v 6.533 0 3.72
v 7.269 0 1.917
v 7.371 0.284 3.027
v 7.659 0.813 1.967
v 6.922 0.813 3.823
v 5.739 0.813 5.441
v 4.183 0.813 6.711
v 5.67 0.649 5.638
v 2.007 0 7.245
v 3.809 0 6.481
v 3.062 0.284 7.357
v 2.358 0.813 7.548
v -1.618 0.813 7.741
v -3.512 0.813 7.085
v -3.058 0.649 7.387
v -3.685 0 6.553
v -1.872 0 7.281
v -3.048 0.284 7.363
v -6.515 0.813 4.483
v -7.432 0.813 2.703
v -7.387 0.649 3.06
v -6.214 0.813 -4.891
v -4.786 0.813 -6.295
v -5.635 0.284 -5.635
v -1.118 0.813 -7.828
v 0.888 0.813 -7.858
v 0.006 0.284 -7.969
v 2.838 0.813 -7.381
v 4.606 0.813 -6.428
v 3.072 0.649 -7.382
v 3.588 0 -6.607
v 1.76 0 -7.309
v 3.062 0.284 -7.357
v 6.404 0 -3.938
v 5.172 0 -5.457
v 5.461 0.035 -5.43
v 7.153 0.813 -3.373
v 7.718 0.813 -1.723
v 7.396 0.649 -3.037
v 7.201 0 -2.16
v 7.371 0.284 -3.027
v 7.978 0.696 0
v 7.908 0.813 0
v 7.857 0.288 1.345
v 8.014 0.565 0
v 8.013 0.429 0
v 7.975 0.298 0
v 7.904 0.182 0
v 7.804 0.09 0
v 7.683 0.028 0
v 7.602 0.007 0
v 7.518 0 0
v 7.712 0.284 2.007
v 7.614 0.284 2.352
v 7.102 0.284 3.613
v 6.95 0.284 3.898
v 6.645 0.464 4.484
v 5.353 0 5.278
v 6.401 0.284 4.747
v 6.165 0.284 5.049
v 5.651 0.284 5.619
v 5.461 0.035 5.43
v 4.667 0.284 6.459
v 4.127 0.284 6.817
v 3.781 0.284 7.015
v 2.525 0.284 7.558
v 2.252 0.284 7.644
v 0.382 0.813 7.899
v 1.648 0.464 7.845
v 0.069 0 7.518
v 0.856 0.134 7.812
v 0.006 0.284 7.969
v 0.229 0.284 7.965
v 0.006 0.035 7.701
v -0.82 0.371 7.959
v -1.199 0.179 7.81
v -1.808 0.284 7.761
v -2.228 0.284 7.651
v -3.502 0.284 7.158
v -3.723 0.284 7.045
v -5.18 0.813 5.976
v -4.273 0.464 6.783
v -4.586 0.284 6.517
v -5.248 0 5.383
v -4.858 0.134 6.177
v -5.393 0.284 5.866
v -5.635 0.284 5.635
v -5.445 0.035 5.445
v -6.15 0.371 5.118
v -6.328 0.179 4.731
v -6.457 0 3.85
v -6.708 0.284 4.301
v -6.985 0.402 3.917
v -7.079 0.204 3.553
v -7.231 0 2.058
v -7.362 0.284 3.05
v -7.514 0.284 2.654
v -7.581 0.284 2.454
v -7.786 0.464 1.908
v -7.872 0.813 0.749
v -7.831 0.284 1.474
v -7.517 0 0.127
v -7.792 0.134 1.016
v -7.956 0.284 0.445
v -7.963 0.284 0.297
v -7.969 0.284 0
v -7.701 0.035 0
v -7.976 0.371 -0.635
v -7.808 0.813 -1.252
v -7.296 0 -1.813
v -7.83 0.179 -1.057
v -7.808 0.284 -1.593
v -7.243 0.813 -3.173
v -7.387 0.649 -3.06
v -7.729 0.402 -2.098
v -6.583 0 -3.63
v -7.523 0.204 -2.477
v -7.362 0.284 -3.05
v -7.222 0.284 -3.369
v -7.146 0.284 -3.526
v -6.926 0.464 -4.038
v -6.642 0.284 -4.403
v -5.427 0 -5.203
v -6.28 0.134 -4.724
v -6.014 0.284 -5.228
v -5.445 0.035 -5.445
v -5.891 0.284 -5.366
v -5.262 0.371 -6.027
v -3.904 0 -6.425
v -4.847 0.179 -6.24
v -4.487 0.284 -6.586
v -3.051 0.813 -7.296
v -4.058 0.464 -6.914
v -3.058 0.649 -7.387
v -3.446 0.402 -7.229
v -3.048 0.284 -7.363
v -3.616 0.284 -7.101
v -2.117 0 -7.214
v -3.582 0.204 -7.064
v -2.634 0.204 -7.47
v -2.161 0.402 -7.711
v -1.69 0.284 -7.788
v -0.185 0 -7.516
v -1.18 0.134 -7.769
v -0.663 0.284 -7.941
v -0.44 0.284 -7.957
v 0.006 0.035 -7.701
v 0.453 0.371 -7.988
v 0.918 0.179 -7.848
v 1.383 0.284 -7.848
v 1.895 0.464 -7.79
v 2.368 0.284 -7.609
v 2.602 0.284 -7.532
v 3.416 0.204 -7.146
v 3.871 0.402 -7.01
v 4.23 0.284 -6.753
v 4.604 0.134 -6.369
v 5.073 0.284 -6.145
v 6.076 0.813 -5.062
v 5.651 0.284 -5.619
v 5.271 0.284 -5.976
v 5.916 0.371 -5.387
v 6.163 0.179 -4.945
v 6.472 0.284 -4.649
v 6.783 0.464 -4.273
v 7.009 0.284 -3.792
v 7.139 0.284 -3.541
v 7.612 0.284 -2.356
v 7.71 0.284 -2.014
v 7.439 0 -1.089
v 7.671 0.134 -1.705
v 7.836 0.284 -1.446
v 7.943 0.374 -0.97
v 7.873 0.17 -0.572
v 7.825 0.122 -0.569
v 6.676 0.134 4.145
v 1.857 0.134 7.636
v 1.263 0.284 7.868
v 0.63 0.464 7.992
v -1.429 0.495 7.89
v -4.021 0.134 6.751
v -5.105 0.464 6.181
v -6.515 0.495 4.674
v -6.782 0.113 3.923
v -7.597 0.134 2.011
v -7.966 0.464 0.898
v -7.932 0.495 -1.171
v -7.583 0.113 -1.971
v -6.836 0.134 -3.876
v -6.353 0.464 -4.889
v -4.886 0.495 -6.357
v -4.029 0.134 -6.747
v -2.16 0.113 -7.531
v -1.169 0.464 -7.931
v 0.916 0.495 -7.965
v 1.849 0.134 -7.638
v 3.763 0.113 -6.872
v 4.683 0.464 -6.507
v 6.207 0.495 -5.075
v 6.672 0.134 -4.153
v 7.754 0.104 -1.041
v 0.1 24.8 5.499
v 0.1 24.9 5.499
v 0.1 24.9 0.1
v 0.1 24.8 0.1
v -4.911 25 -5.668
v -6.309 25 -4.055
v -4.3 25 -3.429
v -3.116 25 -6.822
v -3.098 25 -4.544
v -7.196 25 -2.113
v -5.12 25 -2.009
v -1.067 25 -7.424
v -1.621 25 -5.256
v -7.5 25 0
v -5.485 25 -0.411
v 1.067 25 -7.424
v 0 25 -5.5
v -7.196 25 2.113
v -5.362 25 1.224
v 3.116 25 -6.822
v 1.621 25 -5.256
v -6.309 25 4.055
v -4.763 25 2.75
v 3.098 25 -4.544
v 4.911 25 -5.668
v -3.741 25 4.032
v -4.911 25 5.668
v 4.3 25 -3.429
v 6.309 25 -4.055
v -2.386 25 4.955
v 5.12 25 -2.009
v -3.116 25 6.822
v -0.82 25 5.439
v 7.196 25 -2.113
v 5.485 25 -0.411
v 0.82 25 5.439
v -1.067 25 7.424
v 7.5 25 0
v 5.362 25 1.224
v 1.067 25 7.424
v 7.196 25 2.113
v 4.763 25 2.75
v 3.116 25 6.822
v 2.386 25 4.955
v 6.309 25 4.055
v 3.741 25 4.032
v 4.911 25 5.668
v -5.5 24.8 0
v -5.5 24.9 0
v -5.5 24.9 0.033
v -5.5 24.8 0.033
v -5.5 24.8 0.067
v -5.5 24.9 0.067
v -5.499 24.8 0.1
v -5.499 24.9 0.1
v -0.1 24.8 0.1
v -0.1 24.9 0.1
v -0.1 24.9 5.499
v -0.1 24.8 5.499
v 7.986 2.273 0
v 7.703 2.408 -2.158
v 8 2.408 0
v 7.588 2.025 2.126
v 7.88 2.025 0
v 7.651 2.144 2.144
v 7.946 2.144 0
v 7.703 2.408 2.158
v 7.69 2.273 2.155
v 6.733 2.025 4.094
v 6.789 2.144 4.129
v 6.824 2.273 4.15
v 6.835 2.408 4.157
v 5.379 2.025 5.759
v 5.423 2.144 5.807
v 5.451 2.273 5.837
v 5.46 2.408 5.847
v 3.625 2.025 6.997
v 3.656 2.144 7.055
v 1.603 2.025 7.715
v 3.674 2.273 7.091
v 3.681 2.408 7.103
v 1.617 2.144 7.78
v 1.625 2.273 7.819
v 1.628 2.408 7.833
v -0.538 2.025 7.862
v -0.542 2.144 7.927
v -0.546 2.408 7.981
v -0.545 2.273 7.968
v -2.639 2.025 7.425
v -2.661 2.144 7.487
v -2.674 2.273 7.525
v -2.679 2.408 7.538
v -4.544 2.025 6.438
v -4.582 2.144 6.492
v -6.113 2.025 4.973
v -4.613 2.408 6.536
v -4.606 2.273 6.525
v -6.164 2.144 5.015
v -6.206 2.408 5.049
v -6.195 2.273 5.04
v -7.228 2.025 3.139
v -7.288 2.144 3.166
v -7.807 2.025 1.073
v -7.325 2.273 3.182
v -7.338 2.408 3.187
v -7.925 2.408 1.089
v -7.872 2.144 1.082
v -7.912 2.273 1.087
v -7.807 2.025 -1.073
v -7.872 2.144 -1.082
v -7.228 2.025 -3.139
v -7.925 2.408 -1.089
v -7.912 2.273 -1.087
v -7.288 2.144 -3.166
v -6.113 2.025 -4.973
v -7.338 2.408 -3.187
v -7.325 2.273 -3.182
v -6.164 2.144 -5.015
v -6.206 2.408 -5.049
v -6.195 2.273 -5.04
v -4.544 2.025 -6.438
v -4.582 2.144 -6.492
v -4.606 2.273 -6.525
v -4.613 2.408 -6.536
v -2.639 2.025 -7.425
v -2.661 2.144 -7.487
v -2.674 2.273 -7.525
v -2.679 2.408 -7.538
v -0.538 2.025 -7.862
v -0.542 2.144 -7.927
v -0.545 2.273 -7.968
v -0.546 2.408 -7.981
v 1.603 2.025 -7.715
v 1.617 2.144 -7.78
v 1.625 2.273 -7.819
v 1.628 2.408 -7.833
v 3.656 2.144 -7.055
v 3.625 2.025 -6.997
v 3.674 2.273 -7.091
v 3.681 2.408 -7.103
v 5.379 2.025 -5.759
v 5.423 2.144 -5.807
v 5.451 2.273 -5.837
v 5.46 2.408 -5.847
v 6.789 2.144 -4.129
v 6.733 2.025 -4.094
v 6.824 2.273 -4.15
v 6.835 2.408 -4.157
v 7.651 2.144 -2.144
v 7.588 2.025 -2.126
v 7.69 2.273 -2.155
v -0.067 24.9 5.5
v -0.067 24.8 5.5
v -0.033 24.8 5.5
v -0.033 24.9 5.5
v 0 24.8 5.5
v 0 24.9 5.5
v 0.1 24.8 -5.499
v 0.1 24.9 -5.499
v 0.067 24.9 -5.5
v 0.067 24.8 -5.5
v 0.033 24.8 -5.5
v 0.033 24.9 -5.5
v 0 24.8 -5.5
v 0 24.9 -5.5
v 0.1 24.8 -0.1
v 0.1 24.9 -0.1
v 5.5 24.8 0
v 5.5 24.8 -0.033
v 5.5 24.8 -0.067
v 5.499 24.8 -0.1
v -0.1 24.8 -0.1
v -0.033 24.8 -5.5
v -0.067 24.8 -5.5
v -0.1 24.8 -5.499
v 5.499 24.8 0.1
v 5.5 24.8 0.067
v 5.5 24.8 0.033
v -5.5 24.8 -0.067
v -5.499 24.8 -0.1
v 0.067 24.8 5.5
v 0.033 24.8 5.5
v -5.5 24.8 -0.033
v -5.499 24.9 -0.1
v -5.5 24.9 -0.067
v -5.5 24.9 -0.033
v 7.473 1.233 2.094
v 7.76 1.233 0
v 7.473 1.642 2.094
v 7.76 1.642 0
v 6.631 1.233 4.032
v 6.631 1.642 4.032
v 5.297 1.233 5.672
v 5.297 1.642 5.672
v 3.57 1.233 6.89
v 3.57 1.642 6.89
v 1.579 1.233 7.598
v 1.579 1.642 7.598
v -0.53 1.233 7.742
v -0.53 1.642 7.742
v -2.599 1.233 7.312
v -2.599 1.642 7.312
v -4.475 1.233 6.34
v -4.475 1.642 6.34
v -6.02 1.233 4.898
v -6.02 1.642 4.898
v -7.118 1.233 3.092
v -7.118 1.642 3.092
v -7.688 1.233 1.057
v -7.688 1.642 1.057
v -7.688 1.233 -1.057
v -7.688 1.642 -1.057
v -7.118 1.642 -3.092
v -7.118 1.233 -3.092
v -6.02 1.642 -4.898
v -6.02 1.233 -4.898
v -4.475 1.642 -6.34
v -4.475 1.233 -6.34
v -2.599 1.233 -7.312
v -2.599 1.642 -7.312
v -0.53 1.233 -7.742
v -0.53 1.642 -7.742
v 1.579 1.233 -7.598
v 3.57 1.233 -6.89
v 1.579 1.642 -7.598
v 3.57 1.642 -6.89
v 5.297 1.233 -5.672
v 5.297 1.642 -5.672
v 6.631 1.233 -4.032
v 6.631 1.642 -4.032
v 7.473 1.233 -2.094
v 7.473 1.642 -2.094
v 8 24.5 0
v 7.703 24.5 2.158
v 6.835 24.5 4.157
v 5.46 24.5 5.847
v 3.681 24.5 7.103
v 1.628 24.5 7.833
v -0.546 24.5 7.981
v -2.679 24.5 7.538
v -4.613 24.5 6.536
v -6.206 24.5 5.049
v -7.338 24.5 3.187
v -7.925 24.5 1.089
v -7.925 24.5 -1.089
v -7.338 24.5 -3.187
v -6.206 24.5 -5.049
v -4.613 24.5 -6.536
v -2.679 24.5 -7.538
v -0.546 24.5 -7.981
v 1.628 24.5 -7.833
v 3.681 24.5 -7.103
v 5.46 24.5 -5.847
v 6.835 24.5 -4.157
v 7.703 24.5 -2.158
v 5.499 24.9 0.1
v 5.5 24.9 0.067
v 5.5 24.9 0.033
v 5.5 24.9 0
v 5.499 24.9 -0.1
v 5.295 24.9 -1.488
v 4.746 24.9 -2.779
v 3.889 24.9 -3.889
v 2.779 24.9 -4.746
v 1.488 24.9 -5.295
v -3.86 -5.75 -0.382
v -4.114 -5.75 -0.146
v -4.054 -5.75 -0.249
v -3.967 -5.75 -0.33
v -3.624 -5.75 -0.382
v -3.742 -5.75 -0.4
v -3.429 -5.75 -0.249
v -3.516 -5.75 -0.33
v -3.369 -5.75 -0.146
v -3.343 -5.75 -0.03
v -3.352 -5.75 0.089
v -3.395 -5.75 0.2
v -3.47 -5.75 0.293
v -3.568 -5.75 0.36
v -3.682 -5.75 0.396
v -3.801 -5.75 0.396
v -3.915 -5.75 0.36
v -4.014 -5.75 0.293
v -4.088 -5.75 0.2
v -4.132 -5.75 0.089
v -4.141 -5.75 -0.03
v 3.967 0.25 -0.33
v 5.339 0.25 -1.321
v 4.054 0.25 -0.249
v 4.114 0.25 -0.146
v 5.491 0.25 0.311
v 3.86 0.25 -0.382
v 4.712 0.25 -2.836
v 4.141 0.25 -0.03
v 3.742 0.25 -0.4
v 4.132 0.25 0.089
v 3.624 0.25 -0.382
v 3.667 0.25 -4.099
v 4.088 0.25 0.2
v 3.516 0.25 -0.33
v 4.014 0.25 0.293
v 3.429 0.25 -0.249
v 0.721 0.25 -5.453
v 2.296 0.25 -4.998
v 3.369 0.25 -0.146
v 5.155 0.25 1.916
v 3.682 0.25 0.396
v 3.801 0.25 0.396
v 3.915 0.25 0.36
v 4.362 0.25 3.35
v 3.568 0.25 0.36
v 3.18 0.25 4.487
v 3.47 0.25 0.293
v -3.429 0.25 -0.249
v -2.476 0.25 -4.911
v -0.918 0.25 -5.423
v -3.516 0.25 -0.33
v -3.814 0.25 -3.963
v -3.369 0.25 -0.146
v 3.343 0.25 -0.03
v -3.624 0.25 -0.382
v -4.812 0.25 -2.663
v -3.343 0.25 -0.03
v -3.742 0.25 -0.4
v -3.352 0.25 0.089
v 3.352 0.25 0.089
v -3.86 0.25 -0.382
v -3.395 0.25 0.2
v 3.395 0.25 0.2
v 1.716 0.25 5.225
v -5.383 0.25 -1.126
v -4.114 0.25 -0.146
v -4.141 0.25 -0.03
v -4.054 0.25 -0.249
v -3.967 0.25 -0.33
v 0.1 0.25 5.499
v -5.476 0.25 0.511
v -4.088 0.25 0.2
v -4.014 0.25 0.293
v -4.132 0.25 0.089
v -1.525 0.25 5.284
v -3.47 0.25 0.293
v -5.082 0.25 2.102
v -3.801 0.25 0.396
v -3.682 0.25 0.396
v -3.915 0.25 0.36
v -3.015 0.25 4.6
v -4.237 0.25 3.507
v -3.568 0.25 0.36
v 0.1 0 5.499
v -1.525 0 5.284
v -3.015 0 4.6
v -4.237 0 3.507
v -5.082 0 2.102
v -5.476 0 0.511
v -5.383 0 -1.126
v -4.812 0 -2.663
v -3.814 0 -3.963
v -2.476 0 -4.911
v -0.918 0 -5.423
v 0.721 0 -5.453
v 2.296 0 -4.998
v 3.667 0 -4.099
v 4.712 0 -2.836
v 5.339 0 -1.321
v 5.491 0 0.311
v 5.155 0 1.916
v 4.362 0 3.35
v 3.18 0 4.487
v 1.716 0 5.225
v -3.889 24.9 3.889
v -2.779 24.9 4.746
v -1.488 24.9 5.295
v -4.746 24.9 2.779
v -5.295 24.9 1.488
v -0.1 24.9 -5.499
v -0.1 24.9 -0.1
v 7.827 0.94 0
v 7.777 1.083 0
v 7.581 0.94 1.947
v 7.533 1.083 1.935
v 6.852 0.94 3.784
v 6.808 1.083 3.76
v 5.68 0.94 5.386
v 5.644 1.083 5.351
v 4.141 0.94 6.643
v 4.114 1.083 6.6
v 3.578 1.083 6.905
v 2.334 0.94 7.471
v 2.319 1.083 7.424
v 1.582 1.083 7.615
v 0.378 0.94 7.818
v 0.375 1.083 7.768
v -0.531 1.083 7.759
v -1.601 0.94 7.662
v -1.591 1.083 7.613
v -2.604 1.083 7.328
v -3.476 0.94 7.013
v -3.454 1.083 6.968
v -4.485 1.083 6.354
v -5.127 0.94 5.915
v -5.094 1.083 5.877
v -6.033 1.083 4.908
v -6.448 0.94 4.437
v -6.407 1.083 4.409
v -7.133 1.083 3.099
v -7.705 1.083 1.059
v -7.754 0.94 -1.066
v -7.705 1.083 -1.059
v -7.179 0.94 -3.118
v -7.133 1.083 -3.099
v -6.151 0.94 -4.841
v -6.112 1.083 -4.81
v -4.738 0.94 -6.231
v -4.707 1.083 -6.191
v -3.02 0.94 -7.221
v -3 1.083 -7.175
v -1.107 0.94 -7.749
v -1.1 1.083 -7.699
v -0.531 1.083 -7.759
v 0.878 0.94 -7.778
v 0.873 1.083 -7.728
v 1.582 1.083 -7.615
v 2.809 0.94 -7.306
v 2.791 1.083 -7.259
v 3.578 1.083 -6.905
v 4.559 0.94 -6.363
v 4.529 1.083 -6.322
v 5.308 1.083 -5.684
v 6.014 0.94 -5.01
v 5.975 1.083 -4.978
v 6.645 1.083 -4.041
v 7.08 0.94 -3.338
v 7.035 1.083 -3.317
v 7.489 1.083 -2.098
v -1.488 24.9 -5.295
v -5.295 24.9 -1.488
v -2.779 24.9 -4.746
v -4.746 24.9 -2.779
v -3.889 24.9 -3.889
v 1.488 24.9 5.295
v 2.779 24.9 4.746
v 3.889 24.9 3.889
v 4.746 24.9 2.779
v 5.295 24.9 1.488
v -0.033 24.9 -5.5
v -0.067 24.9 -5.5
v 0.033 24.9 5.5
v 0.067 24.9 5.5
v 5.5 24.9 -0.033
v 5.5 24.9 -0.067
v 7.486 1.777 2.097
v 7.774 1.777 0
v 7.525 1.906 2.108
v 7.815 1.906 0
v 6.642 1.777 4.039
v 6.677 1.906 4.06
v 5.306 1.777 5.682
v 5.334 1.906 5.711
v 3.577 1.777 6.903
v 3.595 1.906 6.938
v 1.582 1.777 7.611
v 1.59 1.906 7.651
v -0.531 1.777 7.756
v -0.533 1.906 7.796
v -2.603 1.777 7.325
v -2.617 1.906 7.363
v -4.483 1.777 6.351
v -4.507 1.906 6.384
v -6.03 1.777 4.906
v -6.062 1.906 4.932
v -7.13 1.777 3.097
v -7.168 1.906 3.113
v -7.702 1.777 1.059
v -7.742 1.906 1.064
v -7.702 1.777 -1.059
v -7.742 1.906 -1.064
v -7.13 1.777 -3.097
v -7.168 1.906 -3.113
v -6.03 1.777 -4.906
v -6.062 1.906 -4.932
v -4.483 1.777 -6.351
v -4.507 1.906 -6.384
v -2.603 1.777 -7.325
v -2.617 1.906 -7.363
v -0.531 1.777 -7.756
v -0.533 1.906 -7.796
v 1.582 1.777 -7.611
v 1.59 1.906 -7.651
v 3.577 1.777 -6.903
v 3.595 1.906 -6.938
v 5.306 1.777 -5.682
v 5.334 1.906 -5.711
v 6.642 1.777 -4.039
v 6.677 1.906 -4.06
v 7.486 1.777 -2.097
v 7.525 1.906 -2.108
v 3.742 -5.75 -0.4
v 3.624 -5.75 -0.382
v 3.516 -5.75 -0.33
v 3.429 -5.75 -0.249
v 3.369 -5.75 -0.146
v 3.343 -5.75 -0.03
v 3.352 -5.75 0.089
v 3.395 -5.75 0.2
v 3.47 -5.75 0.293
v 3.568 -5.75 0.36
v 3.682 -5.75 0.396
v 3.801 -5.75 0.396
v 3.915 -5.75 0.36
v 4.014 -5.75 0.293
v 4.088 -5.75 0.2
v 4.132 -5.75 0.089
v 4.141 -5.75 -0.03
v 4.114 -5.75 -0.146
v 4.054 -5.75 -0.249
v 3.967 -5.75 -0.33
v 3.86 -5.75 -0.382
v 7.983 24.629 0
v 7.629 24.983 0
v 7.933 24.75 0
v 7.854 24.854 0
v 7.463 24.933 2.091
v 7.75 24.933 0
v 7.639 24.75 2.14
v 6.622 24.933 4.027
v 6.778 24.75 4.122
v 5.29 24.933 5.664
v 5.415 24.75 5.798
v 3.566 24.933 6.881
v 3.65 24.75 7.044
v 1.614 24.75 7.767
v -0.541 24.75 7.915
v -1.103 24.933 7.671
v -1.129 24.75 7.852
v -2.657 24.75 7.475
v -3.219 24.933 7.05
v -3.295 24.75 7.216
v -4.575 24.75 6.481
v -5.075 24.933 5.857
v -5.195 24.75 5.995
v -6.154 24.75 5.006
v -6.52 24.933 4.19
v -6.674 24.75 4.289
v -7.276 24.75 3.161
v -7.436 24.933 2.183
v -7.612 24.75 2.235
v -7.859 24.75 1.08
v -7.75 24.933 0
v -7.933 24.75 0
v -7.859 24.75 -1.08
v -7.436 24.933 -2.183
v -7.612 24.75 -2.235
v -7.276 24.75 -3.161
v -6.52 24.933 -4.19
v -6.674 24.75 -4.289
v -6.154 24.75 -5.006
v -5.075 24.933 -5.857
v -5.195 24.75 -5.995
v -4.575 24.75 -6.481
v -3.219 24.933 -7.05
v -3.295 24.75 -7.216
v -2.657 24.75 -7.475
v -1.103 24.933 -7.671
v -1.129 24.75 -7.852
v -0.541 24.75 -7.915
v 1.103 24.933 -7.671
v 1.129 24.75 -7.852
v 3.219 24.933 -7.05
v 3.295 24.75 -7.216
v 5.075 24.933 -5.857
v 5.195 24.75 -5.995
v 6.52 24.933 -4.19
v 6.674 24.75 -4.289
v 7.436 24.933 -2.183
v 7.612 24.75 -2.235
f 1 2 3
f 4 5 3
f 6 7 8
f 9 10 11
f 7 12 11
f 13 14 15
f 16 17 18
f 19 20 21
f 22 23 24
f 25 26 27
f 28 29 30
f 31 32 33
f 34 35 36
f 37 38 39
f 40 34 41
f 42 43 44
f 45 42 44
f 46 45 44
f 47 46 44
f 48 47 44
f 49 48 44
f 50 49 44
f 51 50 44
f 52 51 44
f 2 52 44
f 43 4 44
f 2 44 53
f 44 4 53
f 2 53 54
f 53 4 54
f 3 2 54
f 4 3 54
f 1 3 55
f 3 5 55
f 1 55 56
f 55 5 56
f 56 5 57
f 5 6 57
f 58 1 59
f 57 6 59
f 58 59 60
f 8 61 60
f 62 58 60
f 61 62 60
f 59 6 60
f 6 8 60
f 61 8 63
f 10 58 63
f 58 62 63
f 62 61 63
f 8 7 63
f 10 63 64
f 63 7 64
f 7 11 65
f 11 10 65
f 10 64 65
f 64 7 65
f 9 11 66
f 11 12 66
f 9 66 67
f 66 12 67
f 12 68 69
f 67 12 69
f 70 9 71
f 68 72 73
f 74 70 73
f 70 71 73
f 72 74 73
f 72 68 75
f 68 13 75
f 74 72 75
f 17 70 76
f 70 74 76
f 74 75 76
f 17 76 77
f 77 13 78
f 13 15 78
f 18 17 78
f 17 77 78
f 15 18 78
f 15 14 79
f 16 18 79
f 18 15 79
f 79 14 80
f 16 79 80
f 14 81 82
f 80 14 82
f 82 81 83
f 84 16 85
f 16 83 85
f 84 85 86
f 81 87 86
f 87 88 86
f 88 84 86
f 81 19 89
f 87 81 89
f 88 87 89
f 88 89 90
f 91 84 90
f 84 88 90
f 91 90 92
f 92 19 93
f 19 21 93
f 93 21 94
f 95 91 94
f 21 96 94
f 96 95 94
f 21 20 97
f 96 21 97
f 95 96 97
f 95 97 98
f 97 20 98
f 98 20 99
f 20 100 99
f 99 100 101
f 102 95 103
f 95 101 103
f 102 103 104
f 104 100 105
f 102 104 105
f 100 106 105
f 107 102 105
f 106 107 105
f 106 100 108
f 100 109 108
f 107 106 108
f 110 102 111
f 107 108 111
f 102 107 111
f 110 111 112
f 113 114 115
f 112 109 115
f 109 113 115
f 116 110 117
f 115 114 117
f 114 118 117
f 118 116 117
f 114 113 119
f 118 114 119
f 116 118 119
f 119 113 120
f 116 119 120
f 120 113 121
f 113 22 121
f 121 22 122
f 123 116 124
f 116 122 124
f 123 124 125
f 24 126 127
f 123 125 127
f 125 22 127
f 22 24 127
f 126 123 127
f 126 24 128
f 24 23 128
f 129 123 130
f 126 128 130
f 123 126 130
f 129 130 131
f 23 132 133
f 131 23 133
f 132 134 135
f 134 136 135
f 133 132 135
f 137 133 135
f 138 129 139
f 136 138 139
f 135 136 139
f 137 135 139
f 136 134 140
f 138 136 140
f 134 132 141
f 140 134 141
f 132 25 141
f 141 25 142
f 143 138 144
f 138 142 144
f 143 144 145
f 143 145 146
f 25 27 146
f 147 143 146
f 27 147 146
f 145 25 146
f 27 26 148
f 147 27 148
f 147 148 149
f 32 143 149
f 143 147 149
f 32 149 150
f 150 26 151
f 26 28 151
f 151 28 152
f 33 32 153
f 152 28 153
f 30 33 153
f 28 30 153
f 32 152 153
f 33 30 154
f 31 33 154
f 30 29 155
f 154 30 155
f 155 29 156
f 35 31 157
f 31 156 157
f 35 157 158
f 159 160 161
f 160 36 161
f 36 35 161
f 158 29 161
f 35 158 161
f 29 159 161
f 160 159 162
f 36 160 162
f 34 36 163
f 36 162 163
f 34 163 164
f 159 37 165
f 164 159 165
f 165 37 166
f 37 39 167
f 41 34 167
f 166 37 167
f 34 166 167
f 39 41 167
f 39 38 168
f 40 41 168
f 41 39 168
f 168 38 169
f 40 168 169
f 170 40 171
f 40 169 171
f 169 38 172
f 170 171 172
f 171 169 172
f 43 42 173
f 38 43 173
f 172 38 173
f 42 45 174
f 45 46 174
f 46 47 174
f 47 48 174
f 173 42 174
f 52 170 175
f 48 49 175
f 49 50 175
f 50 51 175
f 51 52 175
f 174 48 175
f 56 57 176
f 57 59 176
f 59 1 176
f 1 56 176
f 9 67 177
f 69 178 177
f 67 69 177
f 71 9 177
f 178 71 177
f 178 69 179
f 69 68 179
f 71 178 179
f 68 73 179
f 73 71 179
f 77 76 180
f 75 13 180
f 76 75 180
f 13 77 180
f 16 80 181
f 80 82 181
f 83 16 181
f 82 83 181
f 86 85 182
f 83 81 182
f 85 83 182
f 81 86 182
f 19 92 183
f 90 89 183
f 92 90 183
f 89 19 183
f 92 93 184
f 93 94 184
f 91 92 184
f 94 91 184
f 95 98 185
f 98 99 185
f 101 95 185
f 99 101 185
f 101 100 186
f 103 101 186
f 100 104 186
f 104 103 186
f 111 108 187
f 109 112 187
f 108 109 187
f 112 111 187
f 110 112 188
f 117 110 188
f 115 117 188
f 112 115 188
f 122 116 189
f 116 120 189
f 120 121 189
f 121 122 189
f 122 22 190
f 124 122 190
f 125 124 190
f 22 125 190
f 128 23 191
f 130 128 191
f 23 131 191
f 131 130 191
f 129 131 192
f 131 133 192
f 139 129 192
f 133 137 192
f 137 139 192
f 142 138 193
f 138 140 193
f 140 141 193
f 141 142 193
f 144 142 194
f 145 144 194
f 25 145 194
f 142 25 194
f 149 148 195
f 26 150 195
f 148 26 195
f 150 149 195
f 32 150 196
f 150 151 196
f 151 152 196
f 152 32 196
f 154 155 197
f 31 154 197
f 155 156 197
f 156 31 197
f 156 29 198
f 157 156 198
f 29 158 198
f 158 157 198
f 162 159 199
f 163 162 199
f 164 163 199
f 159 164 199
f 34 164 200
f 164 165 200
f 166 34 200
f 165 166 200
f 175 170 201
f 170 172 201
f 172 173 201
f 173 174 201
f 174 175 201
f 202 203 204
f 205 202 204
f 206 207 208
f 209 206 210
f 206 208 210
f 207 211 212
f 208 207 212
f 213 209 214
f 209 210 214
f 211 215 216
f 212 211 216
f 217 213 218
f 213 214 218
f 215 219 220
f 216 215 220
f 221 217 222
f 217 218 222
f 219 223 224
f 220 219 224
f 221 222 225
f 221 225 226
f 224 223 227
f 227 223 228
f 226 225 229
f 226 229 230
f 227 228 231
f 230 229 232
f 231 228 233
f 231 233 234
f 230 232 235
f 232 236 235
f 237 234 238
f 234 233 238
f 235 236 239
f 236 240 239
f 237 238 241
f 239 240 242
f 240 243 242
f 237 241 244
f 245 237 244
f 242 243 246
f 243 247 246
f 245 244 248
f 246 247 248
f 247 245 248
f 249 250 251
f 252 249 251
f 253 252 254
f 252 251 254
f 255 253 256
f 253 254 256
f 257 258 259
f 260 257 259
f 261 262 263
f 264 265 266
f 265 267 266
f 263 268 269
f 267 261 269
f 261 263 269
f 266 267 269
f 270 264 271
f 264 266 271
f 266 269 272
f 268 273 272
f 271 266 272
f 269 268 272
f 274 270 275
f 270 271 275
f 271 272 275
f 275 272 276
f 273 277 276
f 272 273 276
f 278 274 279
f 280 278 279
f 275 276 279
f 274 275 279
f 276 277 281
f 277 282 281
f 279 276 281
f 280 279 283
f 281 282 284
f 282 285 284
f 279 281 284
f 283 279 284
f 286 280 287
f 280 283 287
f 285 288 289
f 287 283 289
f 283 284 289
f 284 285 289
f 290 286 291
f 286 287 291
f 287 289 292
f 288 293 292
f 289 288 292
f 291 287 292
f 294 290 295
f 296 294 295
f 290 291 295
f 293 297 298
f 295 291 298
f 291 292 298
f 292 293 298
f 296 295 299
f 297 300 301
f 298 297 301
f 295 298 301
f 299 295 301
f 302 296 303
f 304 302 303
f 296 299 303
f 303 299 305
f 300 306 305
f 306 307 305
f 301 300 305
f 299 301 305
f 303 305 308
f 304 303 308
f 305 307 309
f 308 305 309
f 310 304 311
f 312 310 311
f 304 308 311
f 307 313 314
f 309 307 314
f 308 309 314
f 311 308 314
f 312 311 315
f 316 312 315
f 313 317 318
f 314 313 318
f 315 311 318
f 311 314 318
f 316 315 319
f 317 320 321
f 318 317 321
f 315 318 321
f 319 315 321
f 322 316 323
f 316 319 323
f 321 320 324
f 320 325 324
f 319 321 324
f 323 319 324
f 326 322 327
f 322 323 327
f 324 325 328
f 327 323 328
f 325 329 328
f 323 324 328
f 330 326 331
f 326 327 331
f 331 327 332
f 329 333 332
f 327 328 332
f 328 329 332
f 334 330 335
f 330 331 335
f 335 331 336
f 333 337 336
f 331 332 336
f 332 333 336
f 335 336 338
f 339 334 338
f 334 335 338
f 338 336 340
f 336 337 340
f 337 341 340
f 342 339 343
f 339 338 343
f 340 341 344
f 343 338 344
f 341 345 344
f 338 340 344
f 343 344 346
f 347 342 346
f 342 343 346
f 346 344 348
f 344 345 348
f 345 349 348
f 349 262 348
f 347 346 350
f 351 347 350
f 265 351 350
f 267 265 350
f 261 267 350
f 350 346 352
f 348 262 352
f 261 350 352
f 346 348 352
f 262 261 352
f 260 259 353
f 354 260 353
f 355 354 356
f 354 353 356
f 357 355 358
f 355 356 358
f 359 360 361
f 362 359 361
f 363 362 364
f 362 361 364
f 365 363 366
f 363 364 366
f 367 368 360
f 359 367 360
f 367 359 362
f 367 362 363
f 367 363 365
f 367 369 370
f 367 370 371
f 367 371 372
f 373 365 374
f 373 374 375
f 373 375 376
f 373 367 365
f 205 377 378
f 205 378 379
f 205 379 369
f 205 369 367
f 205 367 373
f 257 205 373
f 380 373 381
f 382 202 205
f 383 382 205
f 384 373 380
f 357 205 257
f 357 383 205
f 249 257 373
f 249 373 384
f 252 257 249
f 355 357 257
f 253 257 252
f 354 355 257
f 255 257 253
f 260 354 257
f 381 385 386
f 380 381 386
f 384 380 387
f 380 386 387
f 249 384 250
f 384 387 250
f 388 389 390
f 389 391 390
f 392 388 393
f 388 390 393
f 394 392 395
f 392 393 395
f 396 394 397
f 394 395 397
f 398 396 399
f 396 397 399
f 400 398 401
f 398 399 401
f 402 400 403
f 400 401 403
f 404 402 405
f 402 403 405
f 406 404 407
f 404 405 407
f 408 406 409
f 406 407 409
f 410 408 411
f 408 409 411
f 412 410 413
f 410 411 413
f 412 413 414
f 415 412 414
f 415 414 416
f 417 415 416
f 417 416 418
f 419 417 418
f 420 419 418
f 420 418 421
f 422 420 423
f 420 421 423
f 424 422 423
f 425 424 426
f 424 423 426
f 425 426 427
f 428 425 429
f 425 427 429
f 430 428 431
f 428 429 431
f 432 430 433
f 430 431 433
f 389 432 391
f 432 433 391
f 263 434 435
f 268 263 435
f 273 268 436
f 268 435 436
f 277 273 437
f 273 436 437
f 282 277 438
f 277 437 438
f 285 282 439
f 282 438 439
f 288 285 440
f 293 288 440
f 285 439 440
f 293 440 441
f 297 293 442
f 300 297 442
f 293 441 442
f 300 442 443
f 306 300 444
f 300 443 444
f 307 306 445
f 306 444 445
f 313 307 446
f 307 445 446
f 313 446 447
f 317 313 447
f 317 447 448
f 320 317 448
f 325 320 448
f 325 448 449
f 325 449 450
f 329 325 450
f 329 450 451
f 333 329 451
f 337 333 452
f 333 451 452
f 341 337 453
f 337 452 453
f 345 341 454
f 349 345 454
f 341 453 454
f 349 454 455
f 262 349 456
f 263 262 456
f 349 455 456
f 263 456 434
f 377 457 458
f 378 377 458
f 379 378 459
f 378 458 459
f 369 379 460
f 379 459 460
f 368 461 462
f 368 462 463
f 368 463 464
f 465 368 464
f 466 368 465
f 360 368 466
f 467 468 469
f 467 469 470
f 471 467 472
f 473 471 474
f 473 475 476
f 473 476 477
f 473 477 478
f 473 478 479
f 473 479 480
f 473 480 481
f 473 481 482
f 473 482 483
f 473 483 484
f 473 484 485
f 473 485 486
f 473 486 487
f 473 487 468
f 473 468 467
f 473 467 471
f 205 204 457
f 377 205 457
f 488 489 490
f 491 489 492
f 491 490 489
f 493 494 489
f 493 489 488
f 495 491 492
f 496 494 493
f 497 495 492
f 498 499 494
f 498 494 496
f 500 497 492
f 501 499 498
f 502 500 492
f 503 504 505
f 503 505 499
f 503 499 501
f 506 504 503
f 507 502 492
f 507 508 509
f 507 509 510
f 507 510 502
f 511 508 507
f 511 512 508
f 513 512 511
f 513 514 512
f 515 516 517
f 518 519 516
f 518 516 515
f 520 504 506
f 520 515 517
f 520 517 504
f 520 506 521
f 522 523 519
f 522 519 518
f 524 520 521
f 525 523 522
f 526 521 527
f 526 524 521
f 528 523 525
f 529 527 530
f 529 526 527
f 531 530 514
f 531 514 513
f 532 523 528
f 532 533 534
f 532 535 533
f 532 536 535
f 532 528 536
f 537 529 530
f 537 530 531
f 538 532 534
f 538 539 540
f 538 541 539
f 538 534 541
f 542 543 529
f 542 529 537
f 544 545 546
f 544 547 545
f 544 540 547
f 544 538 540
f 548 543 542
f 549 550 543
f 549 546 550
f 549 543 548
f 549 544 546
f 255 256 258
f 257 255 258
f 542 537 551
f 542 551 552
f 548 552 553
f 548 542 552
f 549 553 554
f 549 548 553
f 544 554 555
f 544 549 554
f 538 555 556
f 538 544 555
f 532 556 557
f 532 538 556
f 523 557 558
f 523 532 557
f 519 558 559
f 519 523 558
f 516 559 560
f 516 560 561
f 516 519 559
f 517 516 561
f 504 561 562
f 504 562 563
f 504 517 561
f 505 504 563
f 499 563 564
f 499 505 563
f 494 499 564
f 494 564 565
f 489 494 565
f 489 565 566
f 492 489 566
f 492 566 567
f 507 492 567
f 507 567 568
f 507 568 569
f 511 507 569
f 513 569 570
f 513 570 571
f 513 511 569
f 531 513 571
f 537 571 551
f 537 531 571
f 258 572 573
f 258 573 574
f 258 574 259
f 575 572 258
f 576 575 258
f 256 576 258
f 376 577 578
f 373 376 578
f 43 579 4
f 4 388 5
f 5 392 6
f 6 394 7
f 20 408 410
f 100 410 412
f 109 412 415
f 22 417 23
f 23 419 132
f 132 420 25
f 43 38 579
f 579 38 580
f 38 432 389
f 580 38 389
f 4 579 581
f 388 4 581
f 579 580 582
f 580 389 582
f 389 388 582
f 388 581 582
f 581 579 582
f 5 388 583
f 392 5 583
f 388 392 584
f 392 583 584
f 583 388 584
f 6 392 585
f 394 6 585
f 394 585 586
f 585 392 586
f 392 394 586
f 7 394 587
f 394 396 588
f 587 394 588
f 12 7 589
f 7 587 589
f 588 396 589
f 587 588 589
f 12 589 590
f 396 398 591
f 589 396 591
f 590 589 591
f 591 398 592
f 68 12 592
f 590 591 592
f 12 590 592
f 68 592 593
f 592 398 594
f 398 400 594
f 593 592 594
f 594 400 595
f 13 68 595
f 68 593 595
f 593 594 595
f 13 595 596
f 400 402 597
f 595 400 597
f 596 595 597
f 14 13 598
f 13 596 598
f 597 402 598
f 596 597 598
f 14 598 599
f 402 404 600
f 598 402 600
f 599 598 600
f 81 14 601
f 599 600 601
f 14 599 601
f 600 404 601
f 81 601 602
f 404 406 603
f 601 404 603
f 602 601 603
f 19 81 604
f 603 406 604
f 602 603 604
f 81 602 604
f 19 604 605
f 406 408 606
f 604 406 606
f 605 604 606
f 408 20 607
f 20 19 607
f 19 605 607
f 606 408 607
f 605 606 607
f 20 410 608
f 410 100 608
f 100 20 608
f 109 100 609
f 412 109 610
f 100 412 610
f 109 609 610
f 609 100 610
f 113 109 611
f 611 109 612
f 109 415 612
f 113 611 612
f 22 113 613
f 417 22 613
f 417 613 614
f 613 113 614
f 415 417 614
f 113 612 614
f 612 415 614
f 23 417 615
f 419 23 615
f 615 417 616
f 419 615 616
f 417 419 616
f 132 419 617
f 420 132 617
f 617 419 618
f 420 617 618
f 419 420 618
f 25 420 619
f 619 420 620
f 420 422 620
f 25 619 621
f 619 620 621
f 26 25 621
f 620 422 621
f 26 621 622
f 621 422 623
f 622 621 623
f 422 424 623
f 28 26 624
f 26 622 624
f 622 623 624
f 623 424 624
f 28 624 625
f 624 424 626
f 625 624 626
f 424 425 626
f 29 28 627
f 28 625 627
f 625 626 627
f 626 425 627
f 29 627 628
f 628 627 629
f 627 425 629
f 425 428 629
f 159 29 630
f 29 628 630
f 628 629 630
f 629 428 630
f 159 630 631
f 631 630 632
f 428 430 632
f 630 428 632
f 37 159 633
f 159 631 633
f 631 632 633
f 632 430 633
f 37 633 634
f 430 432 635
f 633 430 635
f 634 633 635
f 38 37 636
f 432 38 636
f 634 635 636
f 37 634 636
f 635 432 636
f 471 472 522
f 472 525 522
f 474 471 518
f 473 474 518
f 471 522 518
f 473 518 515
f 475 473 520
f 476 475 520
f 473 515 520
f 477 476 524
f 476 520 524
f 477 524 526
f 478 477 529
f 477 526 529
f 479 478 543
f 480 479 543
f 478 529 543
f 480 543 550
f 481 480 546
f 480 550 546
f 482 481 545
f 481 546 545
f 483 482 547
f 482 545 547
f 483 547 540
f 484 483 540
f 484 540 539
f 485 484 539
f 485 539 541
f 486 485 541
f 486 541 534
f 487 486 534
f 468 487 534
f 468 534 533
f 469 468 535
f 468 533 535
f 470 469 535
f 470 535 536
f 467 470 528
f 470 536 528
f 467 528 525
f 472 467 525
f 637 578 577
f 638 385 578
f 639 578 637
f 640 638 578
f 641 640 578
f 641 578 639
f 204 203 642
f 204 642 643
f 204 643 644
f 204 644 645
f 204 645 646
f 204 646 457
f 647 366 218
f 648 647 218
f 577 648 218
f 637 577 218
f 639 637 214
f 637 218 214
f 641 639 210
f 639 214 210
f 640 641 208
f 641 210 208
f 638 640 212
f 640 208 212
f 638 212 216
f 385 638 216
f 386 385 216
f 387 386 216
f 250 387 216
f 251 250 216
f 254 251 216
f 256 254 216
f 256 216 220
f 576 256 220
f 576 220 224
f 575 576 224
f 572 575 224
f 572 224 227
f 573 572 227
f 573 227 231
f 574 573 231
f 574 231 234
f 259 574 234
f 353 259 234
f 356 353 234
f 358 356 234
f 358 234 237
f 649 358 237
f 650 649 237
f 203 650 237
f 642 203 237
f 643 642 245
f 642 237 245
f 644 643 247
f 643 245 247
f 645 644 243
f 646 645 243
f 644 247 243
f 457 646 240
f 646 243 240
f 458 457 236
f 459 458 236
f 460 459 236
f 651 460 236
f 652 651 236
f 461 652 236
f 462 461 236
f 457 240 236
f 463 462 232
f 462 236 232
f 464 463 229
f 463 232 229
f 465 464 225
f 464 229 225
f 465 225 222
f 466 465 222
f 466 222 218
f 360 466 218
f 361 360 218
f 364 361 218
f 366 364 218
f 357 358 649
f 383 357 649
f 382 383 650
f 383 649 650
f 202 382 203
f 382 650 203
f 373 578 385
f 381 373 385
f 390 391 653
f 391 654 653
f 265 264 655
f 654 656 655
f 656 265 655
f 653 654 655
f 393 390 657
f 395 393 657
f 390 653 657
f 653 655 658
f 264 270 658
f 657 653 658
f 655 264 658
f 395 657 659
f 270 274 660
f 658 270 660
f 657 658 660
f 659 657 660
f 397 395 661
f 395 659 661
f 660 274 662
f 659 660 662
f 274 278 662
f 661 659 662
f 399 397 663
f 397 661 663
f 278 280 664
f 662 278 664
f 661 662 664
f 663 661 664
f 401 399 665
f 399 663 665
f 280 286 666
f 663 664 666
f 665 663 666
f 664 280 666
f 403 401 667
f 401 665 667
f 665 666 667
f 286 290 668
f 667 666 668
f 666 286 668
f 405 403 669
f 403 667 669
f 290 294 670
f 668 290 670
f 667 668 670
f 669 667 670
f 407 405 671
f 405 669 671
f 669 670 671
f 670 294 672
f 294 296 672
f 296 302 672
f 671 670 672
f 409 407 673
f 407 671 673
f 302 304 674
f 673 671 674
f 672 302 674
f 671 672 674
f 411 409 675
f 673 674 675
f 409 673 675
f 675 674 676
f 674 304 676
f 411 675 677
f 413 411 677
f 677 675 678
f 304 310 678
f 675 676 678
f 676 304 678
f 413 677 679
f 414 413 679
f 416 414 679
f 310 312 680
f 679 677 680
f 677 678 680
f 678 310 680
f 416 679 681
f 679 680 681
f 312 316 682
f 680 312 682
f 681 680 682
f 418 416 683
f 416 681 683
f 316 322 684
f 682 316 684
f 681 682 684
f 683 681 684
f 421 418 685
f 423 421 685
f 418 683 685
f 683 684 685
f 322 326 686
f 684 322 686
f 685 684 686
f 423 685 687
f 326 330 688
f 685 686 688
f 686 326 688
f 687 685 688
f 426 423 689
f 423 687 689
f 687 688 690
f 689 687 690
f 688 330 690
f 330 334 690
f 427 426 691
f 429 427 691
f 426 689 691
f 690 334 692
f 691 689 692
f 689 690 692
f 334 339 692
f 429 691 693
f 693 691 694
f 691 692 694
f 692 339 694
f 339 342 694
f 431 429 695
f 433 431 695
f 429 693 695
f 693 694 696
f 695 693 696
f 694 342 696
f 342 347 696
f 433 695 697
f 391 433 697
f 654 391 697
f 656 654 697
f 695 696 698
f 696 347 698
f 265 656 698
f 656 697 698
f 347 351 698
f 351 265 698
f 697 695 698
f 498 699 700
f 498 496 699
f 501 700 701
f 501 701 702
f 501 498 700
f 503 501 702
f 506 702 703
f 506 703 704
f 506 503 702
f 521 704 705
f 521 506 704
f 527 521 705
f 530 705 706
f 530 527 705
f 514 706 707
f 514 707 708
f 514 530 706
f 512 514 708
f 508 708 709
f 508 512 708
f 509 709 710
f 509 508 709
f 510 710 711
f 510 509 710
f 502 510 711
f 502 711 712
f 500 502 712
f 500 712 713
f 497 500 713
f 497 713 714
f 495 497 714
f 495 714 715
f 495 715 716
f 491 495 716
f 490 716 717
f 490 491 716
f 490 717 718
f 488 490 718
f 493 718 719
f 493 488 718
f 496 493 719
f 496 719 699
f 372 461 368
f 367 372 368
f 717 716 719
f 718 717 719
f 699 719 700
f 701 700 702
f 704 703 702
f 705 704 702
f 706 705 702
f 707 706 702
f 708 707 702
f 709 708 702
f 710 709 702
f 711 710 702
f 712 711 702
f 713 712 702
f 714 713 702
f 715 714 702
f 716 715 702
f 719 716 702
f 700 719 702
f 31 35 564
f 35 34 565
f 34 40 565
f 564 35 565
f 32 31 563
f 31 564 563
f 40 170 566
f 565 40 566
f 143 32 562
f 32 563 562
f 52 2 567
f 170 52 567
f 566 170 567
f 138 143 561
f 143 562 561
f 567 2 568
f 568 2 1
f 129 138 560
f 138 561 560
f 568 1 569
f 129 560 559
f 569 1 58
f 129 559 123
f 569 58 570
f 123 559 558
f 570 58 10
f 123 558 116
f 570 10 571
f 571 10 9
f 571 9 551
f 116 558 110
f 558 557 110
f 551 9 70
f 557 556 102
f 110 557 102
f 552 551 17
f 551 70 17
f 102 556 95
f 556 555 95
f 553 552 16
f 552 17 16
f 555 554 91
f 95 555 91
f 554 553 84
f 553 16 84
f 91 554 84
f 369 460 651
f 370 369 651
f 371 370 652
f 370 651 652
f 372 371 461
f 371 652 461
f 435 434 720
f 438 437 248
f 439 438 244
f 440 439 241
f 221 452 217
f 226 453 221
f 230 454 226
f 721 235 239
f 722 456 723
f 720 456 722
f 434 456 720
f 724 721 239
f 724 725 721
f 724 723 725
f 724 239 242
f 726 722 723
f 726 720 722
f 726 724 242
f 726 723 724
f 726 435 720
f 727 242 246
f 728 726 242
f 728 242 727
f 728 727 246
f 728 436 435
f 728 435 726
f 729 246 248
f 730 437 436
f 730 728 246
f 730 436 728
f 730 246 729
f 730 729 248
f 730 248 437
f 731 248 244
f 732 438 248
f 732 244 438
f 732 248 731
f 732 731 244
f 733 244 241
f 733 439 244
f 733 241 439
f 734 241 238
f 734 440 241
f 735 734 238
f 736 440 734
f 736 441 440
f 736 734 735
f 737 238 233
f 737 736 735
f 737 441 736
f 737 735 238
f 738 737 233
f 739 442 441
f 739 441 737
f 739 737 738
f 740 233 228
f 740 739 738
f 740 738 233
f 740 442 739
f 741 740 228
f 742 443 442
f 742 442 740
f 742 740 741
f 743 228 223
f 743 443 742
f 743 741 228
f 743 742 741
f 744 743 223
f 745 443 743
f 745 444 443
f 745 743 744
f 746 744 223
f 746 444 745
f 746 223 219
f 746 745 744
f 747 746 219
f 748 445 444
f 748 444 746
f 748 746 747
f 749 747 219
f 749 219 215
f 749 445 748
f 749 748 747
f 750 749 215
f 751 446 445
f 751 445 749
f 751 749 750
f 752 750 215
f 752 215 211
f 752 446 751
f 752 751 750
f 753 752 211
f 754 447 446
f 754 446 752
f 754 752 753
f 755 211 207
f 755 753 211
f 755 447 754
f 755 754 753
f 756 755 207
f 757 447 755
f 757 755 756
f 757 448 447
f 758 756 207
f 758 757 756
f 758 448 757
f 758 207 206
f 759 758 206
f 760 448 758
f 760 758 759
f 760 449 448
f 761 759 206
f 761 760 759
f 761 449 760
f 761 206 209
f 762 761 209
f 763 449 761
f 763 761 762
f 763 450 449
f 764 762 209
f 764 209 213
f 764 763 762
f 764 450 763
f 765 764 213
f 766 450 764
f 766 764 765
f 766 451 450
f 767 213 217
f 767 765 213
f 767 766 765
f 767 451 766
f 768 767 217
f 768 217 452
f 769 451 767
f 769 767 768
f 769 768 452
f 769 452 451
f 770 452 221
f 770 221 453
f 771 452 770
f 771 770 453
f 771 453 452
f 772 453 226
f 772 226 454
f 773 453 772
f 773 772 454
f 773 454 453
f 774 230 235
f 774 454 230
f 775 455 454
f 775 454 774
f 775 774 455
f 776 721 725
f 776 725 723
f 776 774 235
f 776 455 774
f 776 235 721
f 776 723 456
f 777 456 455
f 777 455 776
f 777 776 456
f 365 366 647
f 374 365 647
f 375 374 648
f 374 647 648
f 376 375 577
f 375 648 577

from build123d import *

# Parameters (mm, degrees)
SKETCH2_R             = 5.5
CUT_EXTRUDE1_DEPTH    = 0.1
CUT_EXTRUDE2_DEPTH    = 0.1
CORTAR_EXTRUIR1_START = -0.25
CROQUIS1_R            = 5.5
CORTAR_EXTRUIR1_DEPTH = 0.25
FILLET1_R             = 0.5
SKETCH4_W             = 0.4
SKETCH4_H             = 6


with BuildPart() as part:
    # Sketch1 → Revolve1 (revolve)
    with BuildSketch(Plane.XY):
        with BuildLine():
            Line((8, 25), (0, 25))
            Line((0, 25), (0, 0))
            Line((0, 0), (8, 0))
            ThreePointArc((8, 0), (8.092932458, 0.406232629), (7.928060317, 0.788957816))
            ThreePointArc((7.928060317, 0.788957816), (7.803725589, 0.995469347), (7.760416667, 1.232599004))
            Line((7.760416667, 1.232599004), (7.760416667, 1.642400996))
            ThreePointArc((7.760416667, 1.642400996), (7.791064683, 1.842850794), (7.880208333, 2.024984899))
            ThreePointArc((7.880208333, 2.024984899), (7.969351983, 2.207119004), (8, 2.407568802))
            Line((8, 2.407568802), (8, 25))
        make_face()
    revolve(axis=Axis((0, 25, 0), (0, -1, 0)))

    # Sketch2 → Cut-Extrude1 (cut)
    with BuildSketch(Plane(origin=(0, 25, 0), x_dir=(-1, 0, 0), z_dir=(0, 1, 0))):
        with Locations(Location((0, 0, 0), (0, 0, 270))):
            Circle(SKETCH2_R)
    extrude(amount=-CUT_EXTRUDE1_DEPTH, mode=Mode.SUBTRACT)

    # Sketch3 → Cut-Extrude2 (cut)
    with BuildSketch(Plane(origin=(0, 24.9, 0), x_dir=(-1, 0, 0), z_dir=(0, 1, 0))):
        with BuildLine():
            Line((-5.499090834, -0.1), (-0.1, -0.1))
            Line((-0.1, -0.1), (-0.1, -5.499090834))
            ThreePointArc((-0.1, -5.499090834), (-0.050002066, -5.499772704), (0, -5.5))
            ThreePointArc((0, -5.5), (0.050002066, -5.499772704), (0.1, -5.499090834))
            Line((0.1, -5.499090834), (0.1, -0.1))
            Line((0.1, -0.1), (5.499090834, -0.1))
            ThreePointArc((5.499090834, -0.1), (5.499772704, -0.050002066), (5.5, 0))
            ThreePointArc((5.5, 0), (5.499772704, 0.050002066), (5.499090834, 0.1))
            Line((5.499090834, 0.1), (0.1, 0.1))
            Line((0.1, 0.1), (0.1, 5.499090834))
            ThreePointArc((0.1, 5.499090834), (0.050002066, 5.499772704), (0, 5.5))
            ThreePointArc((0, 5.5), (-0.050002066, 5.499772704), (-0.1, 5.499090834))
            Line((-0.1, 5.499090834), (-0.1, 0.1))
            Line((-0.1, 0.1), (-5.499090834, 0.1))
            ThreePointArc((-5.499090834, 0.1), (-5.499772704, 0.050002066), (-5.5, 0))
            ThreePointArc((-5.5, 0), (-5.499772704, -0.050002066), (-5.499090834, -0.1))
        make_face()
    extrude(amount=-CUT_EXTRUDE2_DEPTH, mode=Mode.SUBTRACT)

    # Croquis1 → Cortar-Extruir1 (cut)
    with BuildSketch(Plane.XZ.offset(CORTAR_EXTRUIR1_START)):
        with Locations(Location((0, 0, 0), (0, 0, 88.95820115))):
            Circle(CROQUIS1_R)
    extrude(amount=CORTAR_EXTRUIR1_DEPTH, mode=Mode.SUBTRACT)

    # Fillet1
    fillet1_edges = [part.edges().sort_by_distance(p)[0] for p in [
        (-8, 25, 0),
        (-8, 0, 0),
    ]]
    fillet(fillet1_edges, radius=FILLET1_R)

    # Sketch4 → Revolución1 (revolve)
    with BuildSketch(Plane(origin=(0, 0, 0), x_dir=(-1, 0, 0), z_dir=(0, 0, -1)), mode=Mode.PRIVATE) as revoluci_n1_sk:
        with Locations((-3.941657387, -2.75)):
            Rectangle(SKETCH4_W, SKETCH4_H)
    revoluci_n1 = revolve(revoluci_n1_sk.sketch.rotate(Axis((3.741657387, -5.75, 0), (0, 1, 0)), 90), axis=Axis((3.741657387, -5.75, 0), (0, 1, 0)))

    # Simetría1: Revolución1 across plane
    add(revoluci_n1.mirror(Plane(origin=(0, 0, 0), x_dir=(0, 0, 1), z_dir=(1, 0, 0))))


solid = part.part
